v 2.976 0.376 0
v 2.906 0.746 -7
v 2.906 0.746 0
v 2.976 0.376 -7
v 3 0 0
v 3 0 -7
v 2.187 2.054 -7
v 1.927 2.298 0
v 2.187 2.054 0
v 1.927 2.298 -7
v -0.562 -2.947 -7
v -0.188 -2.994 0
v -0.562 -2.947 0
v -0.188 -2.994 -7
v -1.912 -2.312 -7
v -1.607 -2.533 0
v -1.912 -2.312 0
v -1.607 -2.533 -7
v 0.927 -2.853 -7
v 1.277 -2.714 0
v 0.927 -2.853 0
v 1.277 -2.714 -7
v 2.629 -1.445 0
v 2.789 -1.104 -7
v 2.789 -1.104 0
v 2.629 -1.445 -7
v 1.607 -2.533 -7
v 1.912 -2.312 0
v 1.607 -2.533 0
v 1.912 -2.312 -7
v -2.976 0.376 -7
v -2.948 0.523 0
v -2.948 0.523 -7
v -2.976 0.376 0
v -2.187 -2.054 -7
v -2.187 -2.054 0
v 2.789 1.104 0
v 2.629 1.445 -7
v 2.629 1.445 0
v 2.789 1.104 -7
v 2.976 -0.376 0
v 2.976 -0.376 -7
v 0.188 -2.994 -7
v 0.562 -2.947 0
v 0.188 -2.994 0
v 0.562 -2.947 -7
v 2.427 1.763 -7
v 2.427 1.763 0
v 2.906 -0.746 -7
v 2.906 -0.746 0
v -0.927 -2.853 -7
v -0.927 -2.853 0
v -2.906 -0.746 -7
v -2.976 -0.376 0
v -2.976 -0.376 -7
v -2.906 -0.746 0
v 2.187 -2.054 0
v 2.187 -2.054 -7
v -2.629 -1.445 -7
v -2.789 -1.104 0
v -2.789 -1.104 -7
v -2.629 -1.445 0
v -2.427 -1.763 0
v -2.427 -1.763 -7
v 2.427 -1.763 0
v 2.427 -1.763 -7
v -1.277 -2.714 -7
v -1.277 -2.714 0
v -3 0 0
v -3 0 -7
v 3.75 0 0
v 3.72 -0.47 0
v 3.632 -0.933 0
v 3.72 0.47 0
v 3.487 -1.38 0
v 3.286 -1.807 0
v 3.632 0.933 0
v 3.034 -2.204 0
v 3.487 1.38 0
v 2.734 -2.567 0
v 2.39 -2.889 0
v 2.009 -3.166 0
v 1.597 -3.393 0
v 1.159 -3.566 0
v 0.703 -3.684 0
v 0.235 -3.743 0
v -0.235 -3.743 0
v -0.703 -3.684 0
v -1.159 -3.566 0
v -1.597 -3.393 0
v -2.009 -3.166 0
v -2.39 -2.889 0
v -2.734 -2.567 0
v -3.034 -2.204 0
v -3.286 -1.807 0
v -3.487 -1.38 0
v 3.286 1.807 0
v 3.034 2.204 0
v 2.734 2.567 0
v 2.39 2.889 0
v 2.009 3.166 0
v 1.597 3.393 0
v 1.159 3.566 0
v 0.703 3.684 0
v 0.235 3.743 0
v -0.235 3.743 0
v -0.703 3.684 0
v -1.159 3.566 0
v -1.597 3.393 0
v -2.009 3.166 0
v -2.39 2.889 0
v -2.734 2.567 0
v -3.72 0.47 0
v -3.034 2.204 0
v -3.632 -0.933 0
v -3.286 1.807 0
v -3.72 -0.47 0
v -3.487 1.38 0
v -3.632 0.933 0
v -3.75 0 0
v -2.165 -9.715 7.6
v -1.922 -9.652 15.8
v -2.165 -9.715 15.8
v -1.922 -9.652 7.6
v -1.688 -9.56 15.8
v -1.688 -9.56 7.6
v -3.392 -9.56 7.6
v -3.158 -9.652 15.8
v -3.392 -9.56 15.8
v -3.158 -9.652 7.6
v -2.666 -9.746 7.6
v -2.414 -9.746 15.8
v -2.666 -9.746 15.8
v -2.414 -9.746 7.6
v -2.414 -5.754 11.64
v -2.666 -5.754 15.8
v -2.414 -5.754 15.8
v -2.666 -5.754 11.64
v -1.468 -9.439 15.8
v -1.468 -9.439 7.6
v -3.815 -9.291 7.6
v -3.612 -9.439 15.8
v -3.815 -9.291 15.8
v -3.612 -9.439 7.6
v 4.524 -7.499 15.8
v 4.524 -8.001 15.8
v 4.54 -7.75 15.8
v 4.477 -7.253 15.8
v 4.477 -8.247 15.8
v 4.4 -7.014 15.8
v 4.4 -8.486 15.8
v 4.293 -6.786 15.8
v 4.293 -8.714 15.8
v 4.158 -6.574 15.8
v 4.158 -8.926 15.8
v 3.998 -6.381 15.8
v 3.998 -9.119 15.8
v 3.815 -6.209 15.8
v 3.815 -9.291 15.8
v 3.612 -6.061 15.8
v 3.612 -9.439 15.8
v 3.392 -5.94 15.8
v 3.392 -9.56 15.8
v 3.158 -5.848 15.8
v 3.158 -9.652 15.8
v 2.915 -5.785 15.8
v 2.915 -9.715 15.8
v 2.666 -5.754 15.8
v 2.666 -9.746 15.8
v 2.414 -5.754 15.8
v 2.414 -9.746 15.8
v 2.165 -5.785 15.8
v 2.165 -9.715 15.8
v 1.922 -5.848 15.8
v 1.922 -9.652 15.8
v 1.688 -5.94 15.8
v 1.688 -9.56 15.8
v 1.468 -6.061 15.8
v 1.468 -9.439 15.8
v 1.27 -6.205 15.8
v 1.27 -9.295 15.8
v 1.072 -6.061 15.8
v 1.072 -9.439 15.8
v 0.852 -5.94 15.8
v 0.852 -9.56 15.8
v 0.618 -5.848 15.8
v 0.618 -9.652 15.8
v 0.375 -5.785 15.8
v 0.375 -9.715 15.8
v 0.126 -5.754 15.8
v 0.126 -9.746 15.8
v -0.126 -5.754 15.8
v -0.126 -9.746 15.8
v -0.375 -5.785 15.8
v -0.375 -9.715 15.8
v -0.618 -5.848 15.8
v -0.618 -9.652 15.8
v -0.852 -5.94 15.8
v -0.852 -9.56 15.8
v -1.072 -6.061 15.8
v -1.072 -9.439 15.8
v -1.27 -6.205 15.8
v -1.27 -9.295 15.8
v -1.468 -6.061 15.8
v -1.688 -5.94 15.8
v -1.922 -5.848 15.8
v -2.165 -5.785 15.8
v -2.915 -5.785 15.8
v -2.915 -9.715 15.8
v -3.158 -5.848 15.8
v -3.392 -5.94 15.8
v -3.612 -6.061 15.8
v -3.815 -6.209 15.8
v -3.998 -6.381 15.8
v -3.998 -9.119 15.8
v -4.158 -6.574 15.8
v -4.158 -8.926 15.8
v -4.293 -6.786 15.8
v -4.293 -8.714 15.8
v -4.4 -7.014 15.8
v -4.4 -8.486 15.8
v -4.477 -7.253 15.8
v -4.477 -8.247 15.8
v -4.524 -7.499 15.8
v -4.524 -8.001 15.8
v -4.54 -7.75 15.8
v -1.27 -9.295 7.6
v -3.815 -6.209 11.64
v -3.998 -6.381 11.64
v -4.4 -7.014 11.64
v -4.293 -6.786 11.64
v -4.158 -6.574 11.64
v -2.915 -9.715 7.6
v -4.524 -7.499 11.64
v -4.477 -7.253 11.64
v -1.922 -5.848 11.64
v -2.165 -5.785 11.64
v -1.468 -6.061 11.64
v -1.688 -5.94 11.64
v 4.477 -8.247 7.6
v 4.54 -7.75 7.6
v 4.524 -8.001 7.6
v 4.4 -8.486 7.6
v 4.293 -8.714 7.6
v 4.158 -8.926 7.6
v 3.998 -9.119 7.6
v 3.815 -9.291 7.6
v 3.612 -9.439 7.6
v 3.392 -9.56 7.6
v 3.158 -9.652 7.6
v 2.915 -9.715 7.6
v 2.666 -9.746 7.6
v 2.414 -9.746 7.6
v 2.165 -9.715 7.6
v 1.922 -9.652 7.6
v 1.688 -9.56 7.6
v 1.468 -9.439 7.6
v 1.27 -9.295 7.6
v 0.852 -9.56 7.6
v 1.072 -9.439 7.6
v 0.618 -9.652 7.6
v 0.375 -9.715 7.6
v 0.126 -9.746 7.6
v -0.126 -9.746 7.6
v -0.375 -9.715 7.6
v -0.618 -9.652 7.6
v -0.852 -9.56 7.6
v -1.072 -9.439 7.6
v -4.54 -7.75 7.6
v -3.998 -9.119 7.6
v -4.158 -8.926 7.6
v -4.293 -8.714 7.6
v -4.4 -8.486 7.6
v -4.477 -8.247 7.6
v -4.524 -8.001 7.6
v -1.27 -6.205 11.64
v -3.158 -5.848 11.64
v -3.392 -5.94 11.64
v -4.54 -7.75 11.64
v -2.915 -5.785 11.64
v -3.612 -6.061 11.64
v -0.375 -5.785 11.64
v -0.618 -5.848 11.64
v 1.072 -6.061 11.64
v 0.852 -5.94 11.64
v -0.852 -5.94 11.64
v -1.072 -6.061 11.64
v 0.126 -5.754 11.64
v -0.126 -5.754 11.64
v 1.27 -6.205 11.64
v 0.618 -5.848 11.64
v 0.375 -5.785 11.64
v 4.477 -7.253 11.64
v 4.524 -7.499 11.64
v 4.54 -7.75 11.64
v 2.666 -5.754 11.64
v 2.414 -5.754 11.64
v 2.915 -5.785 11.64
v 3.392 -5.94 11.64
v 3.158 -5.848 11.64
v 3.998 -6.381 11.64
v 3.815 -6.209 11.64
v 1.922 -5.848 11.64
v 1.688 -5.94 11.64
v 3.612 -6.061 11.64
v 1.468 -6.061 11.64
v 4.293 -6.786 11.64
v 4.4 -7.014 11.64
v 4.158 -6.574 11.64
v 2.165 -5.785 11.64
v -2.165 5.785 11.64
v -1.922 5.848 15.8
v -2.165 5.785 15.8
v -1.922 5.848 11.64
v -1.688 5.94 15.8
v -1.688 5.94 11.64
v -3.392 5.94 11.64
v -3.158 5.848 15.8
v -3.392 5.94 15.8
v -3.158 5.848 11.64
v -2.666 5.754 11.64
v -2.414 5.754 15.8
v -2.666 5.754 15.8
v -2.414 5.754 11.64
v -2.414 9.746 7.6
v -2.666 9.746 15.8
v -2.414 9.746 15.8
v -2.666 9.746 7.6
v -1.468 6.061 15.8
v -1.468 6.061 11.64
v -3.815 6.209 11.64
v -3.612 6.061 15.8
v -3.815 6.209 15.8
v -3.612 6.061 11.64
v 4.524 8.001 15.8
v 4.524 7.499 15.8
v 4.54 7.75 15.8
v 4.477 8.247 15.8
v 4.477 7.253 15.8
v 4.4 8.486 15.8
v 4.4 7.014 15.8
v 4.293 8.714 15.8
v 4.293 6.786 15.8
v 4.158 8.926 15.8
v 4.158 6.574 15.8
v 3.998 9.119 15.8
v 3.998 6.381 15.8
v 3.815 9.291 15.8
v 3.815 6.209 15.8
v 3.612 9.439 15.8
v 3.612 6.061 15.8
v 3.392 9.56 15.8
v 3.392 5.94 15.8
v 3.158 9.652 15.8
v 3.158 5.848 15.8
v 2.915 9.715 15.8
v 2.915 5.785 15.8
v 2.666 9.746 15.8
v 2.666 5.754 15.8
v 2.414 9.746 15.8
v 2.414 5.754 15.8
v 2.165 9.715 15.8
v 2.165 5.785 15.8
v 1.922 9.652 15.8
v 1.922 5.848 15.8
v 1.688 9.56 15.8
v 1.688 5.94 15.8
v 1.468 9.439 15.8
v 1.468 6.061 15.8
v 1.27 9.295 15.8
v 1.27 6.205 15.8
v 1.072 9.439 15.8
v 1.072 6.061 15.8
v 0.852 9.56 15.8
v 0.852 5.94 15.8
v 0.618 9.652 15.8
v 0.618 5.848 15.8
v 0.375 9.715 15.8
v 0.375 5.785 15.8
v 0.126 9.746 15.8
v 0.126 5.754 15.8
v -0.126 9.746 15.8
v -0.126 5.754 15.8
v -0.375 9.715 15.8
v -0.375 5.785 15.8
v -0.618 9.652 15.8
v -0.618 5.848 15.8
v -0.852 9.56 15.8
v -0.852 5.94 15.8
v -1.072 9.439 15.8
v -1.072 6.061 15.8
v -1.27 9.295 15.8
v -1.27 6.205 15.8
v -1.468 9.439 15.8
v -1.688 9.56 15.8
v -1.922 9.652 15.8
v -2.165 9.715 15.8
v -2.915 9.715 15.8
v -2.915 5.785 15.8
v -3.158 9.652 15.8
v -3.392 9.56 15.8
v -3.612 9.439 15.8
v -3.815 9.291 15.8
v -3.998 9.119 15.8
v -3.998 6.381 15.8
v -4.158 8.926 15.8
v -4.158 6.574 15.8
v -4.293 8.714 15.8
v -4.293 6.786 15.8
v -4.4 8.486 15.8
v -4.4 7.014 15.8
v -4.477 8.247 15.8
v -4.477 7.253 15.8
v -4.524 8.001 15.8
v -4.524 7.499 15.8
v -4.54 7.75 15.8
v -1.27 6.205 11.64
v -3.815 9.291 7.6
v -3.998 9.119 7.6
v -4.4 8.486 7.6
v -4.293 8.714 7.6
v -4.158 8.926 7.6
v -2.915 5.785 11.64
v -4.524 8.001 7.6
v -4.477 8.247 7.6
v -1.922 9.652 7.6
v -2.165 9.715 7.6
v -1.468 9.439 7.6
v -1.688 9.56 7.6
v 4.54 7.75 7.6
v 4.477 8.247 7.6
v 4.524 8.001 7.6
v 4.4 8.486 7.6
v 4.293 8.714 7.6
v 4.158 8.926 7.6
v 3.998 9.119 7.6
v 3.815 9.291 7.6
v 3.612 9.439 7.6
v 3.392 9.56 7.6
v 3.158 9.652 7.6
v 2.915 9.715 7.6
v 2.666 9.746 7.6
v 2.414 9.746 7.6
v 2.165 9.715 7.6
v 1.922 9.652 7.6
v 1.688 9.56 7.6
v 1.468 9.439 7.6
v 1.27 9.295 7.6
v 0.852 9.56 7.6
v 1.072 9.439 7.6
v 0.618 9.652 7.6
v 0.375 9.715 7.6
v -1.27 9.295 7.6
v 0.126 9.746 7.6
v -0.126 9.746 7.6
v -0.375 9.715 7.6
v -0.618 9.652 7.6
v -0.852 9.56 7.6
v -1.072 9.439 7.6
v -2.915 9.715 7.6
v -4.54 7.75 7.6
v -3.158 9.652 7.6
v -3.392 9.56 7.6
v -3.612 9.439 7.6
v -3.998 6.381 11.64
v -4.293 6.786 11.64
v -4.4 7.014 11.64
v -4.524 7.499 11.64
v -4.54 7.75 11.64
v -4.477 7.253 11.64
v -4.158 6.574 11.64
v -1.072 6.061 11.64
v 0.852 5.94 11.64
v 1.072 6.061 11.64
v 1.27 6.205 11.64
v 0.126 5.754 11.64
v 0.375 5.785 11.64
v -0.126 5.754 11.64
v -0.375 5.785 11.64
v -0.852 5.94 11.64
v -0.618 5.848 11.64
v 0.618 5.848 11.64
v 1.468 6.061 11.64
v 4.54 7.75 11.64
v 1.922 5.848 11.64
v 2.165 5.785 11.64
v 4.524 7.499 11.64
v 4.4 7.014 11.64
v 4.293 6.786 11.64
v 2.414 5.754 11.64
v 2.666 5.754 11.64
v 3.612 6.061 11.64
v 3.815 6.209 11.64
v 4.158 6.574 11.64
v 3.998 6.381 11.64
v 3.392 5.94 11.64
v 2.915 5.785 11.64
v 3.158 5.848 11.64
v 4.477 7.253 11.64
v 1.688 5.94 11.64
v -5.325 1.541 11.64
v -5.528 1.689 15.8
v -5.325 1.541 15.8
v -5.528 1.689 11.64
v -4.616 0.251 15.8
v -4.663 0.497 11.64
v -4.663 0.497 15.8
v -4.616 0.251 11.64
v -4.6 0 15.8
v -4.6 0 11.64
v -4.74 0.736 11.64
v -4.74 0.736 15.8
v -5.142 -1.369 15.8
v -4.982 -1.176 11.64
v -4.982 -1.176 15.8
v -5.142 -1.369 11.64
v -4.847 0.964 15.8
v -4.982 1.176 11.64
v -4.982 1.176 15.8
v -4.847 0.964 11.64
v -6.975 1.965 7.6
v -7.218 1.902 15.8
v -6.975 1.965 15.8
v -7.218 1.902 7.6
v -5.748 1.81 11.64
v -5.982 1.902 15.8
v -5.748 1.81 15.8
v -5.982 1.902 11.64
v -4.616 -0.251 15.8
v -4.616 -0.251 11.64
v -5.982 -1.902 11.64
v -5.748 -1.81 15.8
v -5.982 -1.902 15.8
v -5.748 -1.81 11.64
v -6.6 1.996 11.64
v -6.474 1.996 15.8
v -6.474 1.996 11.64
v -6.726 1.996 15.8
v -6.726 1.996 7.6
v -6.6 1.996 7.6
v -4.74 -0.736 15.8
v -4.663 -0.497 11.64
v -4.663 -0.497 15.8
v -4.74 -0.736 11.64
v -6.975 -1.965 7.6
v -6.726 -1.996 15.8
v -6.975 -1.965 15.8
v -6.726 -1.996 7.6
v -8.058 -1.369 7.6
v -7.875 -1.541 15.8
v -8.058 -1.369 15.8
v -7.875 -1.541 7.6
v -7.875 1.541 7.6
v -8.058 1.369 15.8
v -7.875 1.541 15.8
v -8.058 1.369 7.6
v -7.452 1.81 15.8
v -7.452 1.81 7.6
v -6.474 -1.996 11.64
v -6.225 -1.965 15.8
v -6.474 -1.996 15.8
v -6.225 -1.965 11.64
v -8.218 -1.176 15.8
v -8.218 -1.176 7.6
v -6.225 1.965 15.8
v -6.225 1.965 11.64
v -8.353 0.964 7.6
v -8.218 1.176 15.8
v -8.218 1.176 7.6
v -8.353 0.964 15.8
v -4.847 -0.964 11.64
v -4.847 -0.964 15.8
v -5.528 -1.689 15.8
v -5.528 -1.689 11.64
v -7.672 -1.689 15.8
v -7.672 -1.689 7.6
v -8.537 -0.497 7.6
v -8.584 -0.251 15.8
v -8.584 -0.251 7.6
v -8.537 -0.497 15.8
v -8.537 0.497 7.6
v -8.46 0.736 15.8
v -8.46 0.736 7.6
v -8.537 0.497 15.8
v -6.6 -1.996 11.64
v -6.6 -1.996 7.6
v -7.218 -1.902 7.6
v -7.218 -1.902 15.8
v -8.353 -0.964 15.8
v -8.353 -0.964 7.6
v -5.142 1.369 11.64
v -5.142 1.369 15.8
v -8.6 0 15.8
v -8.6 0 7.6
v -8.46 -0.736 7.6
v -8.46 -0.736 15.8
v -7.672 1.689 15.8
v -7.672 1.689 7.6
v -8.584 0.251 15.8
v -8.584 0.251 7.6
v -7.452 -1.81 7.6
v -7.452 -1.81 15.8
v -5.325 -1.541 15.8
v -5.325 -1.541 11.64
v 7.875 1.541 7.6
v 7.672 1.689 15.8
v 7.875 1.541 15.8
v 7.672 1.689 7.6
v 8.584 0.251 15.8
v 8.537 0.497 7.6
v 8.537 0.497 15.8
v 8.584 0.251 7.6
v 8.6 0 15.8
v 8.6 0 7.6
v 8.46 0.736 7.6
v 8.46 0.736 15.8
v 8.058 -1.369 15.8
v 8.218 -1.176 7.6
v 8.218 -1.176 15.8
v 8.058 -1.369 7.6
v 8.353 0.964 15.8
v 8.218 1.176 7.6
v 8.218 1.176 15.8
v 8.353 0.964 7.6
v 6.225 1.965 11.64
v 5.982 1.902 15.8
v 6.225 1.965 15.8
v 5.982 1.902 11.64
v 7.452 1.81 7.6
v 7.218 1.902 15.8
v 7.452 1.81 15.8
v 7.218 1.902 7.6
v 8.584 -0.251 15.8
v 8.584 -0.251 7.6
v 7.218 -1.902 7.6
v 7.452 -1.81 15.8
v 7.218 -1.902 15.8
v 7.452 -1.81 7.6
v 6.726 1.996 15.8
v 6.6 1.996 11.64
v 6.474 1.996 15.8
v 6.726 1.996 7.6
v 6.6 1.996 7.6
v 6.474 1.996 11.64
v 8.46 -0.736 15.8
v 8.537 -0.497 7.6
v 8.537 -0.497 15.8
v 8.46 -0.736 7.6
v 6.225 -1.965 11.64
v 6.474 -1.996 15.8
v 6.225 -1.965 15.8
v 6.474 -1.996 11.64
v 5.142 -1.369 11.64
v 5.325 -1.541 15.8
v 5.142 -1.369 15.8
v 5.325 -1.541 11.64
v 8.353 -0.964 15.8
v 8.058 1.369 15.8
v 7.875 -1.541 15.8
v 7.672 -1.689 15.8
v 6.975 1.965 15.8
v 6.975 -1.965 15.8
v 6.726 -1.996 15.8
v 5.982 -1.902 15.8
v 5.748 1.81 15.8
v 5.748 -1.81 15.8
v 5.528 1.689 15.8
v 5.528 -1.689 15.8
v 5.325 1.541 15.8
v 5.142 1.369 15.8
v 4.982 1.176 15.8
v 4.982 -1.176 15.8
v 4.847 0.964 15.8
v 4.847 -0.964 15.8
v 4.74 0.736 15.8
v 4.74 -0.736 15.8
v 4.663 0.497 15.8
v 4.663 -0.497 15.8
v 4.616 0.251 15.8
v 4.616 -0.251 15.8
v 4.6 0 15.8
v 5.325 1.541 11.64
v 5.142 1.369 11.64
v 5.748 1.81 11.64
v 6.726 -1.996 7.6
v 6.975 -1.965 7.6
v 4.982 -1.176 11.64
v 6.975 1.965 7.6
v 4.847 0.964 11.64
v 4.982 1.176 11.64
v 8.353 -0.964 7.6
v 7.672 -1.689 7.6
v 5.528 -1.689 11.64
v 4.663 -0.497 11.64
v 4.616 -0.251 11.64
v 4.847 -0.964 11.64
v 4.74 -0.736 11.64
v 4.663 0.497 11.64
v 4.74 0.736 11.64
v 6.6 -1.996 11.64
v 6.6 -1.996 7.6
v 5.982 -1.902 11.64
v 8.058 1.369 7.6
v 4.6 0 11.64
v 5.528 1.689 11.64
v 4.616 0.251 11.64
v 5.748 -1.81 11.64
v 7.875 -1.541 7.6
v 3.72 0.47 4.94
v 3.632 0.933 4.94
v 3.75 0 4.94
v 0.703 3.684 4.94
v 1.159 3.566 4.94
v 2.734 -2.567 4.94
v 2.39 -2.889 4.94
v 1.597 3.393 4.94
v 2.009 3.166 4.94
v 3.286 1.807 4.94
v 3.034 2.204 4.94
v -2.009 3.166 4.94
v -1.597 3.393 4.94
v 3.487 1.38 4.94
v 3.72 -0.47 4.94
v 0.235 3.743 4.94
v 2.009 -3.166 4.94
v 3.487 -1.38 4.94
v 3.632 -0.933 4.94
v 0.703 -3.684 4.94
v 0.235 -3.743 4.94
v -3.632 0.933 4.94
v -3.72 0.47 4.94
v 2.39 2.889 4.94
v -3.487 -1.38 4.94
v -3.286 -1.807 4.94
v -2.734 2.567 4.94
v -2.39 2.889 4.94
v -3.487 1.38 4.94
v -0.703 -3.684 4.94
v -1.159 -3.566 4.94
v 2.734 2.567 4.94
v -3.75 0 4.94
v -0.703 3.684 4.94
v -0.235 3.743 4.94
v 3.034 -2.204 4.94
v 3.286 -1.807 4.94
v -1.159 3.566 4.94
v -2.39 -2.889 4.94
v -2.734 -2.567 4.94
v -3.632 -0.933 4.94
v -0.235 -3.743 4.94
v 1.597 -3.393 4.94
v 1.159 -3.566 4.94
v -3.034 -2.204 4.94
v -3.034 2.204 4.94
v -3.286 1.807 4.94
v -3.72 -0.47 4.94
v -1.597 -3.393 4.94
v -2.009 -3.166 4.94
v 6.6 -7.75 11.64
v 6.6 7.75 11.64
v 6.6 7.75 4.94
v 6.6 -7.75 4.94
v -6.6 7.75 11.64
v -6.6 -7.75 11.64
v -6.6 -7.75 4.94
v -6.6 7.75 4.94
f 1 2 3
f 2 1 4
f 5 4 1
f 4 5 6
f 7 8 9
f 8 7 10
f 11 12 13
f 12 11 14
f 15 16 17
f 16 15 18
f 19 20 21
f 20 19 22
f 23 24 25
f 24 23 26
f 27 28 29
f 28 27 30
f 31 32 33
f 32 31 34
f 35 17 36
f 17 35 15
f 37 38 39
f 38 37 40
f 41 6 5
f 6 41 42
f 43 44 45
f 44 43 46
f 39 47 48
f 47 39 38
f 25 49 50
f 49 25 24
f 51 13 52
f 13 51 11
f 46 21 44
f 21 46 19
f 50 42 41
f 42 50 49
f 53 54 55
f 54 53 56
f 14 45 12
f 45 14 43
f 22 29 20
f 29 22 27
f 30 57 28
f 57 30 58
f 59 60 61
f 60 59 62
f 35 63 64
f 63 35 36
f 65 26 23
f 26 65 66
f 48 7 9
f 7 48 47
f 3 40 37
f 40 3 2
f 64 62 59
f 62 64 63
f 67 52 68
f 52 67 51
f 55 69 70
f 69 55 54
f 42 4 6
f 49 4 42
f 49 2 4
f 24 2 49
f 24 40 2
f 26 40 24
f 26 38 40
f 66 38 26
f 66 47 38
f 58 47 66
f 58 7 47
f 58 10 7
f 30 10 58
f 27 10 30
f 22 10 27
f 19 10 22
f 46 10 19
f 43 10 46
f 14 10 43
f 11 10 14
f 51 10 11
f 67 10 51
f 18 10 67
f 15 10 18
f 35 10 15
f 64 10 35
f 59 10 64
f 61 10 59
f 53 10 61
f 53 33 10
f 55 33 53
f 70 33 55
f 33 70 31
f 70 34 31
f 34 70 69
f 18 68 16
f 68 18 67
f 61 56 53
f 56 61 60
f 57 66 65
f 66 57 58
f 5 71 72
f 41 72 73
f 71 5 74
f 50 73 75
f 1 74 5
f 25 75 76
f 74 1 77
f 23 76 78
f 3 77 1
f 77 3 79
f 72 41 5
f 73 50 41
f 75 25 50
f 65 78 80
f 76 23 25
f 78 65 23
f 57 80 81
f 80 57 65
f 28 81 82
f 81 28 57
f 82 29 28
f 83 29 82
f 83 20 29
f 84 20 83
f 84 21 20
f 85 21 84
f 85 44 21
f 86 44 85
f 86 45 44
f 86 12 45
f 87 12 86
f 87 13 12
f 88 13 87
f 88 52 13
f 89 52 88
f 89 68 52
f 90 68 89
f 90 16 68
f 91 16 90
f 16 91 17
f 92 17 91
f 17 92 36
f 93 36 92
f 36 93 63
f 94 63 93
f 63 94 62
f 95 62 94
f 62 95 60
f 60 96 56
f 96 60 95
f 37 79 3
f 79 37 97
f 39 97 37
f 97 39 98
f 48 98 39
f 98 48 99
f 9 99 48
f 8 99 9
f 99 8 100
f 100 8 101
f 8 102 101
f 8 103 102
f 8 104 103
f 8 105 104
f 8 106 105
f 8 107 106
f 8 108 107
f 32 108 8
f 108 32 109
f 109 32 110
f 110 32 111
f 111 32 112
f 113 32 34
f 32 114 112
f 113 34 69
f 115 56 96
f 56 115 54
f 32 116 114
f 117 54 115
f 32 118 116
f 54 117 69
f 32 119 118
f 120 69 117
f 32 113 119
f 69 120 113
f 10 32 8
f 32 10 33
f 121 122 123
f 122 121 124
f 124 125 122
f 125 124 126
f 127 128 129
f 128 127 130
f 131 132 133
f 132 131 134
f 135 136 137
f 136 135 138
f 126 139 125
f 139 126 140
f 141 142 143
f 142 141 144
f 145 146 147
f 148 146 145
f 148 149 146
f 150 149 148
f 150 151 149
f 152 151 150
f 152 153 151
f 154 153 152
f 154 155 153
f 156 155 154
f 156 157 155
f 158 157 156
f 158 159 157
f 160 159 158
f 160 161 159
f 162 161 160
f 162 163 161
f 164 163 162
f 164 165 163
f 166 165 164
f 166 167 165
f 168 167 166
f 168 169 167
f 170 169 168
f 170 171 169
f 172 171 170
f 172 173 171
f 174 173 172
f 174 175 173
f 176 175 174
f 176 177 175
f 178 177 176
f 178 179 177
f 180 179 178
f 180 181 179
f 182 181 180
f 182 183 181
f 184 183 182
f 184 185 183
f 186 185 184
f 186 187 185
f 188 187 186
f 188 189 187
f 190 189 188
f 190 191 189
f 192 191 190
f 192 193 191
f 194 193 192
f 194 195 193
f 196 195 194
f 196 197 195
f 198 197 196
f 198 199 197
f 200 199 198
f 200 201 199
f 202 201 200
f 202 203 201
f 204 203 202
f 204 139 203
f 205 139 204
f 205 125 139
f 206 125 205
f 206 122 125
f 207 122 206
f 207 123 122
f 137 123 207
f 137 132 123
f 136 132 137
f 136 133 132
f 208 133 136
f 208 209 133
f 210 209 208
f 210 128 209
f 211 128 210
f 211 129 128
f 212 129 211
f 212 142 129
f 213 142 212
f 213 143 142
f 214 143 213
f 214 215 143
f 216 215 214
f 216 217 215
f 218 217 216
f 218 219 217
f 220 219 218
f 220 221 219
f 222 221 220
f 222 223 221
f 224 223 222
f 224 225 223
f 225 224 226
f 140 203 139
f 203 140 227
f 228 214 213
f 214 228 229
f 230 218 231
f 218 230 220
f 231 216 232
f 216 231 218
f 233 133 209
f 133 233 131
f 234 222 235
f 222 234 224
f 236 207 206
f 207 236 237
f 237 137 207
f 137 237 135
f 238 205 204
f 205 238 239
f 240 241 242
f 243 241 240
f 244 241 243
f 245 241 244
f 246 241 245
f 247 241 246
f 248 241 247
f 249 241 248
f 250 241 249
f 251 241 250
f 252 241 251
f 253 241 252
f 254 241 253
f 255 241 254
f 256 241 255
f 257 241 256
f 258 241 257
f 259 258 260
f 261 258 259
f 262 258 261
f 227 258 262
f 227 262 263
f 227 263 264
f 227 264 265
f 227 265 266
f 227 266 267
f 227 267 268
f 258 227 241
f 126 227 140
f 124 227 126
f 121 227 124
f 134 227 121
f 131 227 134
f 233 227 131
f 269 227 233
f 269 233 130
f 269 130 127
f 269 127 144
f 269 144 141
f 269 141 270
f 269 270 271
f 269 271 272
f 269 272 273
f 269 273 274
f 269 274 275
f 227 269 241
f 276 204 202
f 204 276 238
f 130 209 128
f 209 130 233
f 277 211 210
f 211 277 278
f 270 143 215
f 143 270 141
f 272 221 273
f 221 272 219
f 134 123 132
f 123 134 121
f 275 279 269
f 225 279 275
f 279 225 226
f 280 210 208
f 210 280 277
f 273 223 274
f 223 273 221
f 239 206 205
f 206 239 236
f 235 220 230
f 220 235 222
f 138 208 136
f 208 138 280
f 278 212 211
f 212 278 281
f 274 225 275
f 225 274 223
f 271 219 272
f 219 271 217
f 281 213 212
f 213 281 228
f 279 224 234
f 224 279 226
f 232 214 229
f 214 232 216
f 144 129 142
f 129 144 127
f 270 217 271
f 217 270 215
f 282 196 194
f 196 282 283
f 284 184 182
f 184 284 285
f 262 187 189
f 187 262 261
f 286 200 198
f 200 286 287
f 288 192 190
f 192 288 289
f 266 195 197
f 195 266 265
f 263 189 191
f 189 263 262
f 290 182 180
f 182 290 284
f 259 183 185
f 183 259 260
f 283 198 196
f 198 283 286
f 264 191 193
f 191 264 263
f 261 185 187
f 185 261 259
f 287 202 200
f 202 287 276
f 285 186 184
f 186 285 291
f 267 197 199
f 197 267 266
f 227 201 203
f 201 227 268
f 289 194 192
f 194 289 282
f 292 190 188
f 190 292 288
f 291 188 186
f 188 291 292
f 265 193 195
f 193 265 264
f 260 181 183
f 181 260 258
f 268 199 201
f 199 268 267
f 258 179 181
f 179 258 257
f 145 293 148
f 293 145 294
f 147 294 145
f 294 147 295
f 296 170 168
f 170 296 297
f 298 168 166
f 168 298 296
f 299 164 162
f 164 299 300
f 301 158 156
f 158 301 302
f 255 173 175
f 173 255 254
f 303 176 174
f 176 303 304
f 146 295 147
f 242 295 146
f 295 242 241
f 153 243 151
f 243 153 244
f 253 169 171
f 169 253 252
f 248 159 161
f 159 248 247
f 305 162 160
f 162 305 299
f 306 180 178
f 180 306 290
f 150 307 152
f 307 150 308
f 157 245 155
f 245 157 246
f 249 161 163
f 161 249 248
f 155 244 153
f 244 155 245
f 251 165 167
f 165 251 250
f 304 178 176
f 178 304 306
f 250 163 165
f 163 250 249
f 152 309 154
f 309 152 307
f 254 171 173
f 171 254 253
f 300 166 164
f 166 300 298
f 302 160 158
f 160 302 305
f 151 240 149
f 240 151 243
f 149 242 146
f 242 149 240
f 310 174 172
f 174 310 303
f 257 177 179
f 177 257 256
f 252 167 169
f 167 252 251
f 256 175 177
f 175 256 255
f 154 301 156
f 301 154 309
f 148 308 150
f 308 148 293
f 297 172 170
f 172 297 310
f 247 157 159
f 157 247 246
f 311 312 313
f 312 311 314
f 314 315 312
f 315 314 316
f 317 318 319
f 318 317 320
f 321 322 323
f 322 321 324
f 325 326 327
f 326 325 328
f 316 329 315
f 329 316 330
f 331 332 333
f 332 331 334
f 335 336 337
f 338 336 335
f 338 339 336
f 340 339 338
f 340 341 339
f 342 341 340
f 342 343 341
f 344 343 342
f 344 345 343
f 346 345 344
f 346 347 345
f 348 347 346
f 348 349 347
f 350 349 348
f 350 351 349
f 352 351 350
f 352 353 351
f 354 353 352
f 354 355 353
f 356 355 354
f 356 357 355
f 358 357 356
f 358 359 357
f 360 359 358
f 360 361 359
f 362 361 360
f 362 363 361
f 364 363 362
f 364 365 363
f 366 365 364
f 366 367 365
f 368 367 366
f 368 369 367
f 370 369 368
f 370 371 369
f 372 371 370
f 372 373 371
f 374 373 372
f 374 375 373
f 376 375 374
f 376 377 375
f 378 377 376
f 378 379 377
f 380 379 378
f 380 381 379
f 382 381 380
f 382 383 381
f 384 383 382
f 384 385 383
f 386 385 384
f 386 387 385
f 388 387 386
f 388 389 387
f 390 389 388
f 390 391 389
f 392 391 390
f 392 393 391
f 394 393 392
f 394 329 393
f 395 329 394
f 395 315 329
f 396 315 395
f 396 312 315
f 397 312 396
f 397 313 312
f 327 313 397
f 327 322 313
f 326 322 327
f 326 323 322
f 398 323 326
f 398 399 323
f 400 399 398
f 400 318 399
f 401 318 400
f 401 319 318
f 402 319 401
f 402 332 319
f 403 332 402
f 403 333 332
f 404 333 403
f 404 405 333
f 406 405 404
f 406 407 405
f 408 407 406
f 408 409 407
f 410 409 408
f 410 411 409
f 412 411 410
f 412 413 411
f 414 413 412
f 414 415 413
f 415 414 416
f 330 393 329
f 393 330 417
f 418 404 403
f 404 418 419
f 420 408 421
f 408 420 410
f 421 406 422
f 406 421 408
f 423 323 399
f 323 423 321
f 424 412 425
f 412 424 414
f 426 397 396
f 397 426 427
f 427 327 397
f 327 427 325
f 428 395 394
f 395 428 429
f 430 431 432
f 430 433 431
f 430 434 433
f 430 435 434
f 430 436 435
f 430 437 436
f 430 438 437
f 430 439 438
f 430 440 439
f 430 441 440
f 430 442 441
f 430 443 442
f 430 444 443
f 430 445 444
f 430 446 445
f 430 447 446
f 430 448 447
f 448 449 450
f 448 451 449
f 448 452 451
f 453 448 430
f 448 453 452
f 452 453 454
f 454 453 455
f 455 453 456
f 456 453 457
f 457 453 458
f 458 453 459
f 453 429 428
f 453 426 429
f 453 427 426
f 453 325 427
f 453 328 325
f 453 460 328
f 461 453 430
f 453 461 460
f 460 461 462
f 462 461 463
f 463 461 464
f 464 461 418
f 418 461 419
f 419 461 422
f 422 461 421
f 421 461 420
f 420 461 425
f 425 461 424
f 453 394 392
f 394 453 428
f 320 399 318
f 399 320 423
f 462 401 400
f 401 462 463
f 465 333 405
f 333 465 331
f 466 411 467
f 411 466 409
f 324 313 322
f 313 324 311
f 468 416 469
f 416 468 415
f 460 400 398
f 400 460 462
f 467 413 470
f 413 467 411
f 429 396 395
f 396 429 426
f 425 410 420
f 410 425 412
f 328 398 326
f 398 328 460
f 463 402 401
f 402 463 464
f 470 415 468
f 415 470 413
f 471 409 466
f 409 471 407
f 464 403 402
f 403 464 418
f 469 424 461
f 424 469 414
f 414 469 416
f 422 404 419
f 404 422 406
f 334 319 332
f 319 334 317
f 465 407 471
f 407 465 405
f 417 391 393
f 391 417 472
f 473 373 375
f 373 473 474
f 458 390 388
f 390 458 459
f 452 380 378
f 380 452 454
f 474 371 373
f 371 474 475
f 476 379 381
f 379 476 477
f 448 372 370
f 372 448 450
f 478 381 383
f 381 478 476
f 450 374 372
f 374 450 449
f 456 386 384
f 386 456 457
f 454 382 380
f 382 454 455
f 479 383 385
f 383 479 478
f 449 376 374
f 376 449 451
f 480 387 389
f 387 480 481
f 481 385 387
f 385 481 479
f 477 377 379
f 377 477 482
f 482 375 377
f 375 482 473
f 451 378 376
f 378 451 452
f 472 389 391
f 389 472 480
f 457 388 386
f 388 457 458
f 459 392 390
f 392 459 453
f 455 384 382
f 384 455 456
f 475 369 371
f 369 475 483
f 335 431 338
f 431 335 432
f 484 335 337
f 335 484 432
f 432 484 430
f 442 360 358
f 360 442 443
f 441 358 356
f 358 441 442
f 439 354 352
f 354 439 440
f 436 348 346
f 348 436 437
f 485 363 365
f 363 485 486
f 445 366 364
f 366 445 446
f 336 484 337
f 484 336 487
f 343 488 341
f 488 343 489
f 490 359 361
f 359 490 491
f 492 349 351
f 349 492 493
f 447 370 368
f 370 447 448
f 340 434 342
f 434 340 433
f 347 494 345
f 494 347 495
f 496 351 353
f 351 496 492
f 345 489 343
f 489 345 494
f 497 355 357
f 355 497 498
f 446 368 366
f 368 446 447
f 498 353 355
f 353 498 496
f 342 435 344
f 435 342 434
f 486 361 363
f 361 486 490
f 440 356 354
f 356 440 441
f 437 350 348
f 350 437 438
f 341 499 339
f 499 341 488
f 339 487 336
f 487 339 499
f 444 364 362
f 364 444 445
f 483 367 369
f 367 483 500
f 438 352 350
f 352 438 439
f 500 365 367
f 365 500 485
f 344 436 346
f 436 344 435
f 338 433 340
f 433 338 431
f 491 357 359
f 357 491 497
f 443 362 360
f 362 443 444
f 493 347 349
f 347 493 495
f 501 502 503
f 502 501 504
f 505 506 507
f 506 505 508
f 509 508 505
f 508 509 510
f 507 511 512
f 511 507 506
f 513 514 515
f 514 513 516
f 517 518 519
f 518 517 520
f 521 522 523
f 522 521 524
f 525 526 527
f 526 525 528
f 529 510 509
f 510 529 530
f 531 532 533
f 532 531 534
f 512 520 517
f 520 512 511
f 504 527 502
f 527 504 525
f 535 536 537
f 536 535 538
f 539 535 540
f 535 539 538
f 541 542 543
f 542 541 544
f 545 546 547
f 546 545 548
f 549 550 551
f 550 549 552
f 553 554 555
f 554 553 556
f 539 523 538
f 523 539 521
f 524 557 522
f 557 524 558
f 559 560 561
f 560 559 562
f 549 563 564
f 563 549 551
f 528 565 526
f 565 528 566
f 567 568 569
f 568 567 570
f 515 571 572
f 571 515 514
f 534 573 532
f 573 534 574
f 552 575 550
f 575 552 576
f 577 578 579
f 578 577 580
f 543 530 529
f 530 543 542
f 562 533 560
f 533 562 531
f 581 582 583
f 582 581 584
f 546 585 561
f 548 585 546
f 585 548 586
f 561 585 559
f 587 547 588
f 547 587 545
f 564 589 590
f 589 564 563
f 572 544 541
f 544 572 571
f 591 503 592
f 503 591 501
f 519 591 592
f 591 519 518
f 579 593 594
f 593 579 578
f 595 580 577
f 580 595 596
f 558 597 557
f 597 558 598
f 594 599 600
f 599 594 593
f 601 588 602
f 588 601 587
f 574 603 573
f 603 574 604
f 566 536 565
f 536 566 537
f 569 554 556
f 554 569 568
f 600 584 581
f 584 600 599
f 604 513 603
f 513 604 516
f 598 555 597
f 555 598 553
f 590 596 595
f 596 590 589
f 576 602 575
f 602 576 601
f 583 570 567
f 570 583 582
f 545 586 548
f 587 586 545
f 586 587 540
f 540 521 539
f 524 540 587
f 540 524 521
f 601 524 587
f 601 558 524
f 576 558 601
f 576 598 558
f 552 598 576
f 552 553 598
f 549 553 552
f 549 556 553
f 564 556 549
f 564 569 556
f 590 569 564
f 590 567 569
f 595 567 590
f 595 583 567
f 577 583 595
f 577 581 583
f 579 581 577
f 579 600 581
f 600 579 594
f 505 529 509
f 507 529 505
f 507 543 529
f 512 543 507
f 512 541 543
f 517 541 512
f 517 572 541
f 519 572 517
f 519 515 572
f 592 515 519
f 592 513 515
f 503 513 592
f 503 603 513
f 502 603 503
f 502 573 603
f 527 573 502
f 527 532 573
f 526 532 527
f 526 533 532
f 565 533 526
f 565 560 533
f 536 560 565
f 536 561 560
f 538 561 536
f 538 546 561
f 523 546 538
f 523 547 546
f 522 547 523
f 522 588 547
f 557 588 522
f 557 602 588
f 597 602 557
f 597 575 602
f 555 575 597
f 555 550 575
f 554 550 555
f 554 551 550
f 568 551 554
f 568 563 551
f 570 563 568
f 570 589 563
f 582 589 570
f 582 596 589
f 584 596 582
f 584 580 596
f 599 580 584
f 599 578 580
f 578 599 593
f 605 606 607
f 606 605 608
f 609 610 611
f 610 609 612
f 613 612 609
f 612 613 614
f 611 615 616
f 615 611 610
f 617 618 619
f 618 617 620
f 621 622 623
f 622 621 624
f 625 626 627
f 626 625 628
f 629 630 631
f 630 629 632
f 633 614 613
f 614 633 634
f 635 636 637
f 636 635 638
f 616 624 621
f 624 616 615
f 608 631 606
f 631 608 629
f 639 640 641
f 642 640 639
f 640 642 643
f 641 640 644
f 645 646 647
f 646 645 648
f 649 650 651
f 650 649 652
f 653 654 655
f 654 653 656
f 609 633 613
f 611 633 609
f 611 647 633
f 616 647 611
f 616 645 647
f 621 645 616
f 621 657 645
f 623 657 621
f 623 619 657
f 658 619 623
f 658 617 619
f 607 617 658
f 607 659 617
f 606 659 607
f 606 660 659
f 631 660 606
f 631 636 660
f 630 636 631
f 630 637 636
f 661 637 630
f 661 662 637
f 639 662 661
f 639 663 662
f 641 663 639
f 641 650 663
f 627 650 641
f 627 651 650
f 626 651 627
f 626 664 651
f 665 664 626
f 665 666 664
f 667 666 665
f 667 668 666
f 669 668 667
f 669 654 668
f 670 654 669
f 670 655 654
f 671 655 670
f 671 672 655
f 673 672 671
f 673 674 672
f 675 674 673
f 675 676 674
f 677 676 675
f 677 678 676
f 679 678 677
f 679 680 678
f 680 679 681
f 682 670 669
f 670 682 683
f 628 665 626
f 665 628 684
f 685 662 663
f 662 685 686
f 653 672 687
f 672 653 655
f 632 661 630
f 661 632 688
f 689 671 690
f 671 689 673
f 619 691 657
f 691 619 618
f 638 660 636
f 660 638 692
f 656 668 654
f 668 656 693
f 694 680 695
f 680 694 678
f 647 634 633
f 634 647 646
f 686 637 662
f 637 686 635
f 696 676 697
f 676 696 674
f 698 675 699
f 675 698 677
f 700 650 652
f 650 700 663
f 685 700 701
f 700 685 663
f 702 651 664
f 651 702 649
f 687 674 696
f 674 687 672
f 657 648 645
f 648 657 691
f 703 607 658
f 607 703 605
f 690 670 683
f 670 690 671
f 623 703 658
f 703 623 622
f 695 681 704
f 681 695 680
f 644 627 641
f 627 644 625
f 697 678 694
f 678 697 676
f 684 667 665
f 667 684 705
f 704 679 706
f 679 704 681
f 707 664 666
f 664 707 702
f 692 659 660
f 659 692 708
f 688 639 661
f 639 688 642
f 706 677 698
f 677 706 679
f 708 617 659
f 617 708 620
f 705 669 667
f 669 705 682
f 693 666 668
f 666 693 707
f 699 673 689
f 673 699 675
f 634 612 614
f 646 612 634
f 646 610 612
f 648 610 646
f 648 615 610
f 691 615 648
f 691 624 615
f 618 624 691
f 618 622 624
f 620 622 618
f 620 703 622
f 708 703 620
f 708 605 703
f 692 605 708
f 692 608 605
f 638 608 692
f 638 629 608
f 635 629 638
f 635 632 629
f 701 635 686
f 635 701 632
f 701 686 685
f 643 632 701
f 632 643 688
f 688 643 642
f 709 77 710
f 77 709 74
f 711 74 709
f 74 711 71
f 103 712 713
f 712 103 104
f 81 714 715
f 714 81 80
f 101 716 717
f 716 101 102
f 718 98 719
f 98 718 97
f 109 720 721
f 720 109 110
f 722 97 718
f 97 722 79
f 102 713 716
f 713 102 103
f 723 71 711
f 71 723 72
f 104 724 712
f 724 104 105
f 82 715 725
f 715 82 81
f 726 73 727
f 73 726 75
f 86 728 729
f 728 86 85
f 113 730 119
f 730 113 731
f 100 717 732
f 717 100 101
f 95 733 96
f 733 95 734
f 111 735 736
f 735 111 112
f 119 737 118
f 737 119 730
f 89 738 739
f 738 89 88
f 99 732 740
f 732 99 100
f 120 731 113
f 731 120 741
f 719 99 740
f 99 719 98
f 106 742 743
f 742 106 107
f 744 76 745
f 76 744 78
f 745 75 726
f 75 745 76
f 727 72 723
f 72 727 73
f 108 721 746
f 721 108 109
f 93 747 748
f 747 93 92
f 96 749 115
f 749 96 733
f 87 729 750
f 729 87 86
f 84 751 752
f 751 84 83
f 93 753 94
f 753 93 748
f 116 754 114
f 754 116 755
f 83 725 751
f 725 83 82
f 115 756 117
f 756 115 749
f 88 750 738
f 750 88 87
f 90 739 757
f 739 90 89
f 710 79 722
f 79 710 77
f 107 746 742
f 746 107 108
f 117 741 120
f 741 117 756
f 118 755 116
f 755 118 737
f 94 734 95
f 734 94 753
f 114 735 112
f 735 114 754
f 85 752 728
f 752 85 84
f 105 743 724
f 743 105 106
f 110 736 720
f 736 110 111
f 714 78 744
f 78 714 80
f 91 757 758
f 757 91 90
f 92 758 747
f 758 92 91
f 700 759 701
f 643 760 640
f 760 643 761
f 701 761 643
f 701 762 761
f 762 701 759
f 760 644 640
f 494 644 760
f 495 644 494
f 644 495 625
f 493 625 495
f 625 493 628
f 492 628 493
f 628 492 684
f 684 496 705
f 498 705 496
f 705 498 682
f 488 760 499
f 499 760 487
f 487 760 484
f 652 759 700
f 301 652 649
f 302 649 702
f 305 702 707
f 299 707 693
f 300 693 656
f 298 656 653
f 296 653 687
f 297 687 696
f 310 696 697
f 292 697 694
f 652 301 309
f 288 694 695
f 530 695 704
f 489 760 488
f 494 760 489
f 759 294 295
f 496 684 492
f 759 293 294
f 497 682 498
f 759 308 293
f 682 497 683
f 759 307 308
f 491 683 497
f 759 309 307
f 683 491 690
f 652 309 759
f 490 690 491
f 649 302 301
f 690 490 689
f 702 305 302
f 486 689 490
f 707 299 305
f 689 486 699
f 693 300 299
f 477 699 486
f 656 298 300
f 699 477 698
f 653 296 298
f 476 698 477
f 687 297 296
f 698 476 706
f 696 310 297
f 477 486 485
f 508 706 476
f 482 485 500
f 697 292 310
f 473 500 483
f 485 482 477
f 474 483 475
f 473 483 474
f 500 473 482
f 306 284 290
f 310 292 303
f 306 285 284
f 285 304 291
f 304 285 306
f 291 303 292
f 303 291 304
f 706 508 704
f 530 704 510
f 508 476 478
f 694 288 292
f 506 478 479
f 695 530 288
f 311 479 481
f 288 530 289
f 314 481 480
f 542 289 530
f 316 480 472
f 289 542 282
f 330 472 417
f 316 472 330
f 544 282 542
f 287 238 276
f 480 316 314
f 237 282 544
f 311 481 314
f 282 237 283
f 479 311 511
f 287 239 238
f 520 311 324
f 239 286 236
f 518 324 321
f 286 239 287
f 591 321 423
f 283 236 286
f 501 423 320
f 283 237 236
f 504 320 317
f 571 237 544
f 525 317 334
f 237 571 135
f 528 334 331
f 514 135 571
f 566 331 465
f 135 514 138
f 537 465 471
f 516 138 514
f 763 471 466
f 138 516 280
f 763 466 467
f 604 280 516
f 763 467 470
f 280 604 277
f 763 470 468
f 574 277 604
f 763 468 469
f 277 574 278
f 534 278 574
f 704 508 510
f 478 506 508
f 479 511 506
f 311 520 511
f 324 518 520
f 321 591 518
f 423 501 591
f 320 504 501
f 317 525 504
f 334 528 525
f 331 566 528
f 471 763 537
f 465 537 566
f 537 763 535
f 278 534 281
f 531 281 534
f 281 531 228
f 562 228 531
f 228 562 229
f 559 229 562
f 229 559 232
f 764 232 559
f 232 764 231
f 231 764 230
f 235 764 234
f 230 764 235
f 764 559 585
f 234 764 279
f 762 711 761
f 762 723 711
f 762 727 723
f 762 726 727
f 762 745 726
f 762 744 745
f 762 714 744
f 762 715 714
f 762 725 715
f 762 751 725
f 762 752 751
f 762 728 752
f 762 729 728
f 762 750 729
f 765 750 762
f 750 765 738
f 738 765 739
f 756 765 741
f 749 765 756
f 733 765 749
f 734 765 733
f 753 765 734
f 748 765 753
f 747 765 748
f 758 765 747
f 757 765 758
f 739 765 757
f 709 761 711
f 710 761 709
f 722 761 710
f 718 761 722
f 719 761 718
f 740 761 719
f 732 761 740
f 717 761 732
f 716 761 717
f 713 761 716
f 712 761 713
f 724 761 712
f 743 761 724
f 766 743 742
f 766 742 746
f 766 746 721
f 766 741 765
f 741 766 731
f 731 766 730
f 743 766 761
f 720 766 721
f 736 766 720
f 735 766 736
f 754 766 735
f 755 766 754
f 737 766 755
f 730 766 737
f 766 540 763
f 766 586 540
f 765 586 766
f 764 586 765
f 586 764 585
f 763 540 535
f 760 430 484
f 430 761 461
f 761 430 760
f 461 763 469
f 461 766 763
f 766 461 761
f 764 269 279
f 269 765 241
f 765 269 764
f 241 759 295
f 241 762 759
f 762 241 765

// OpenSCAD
encoderHull();

$fn = 50;

encX	= 12.7	+0.5;
encY	= 15	+0.5;
encZ	= 6.6;
tipDia	= 6;
tipCut	= 4.5;
tipLen	= 7;
rodDia	= 7		+0.5;
rodLen	= 6		-1;
pinH	= 7.2	+1;
pinD	= 2		+2;
pinOff	= 4;
pinZ	= rodLen+encZ-pinOff;

function encoderX() = encX;
function encoderY() = encY;
function encoderZ() = encZ+rodLen+pinH-pinOff;


module encoderHull()
{
	cylinder(r=rodDia/2, h=rodLen+1, center=false);
	
	translate([0, 0, -tipLen])
	difference()
	{
		cylinder(r=tipDia/2, h=tipLen+1, center=false);
		
		rotate([0, 0, -70])
		translate([tipDia/2-tipCut, tipDia, -1])
		rotate([0, 0, 180])
		cube([2*tipDia, 2*tipDia, tipLen+1]);
	}

	translate([0, 0, rodLen+encZ/2-0.01])
	cube([encX, encY, encZ+0.1], center = true);
	
	for (iy=[-1, 1])
	{
		for (ix=[-1, 0, 1])
		{
			translate([ix*2.54, iy*encY/2, pinZ])
			cylinder(r=pinD/2, h=pinH, center=false);
		}
	}
	
	for (ix=[-1, 1])
	{
		translate([ix*encX/2, 0, pinZ])
		cylinder(r=pinD/2, h=pinH, center=false);
	}
}
